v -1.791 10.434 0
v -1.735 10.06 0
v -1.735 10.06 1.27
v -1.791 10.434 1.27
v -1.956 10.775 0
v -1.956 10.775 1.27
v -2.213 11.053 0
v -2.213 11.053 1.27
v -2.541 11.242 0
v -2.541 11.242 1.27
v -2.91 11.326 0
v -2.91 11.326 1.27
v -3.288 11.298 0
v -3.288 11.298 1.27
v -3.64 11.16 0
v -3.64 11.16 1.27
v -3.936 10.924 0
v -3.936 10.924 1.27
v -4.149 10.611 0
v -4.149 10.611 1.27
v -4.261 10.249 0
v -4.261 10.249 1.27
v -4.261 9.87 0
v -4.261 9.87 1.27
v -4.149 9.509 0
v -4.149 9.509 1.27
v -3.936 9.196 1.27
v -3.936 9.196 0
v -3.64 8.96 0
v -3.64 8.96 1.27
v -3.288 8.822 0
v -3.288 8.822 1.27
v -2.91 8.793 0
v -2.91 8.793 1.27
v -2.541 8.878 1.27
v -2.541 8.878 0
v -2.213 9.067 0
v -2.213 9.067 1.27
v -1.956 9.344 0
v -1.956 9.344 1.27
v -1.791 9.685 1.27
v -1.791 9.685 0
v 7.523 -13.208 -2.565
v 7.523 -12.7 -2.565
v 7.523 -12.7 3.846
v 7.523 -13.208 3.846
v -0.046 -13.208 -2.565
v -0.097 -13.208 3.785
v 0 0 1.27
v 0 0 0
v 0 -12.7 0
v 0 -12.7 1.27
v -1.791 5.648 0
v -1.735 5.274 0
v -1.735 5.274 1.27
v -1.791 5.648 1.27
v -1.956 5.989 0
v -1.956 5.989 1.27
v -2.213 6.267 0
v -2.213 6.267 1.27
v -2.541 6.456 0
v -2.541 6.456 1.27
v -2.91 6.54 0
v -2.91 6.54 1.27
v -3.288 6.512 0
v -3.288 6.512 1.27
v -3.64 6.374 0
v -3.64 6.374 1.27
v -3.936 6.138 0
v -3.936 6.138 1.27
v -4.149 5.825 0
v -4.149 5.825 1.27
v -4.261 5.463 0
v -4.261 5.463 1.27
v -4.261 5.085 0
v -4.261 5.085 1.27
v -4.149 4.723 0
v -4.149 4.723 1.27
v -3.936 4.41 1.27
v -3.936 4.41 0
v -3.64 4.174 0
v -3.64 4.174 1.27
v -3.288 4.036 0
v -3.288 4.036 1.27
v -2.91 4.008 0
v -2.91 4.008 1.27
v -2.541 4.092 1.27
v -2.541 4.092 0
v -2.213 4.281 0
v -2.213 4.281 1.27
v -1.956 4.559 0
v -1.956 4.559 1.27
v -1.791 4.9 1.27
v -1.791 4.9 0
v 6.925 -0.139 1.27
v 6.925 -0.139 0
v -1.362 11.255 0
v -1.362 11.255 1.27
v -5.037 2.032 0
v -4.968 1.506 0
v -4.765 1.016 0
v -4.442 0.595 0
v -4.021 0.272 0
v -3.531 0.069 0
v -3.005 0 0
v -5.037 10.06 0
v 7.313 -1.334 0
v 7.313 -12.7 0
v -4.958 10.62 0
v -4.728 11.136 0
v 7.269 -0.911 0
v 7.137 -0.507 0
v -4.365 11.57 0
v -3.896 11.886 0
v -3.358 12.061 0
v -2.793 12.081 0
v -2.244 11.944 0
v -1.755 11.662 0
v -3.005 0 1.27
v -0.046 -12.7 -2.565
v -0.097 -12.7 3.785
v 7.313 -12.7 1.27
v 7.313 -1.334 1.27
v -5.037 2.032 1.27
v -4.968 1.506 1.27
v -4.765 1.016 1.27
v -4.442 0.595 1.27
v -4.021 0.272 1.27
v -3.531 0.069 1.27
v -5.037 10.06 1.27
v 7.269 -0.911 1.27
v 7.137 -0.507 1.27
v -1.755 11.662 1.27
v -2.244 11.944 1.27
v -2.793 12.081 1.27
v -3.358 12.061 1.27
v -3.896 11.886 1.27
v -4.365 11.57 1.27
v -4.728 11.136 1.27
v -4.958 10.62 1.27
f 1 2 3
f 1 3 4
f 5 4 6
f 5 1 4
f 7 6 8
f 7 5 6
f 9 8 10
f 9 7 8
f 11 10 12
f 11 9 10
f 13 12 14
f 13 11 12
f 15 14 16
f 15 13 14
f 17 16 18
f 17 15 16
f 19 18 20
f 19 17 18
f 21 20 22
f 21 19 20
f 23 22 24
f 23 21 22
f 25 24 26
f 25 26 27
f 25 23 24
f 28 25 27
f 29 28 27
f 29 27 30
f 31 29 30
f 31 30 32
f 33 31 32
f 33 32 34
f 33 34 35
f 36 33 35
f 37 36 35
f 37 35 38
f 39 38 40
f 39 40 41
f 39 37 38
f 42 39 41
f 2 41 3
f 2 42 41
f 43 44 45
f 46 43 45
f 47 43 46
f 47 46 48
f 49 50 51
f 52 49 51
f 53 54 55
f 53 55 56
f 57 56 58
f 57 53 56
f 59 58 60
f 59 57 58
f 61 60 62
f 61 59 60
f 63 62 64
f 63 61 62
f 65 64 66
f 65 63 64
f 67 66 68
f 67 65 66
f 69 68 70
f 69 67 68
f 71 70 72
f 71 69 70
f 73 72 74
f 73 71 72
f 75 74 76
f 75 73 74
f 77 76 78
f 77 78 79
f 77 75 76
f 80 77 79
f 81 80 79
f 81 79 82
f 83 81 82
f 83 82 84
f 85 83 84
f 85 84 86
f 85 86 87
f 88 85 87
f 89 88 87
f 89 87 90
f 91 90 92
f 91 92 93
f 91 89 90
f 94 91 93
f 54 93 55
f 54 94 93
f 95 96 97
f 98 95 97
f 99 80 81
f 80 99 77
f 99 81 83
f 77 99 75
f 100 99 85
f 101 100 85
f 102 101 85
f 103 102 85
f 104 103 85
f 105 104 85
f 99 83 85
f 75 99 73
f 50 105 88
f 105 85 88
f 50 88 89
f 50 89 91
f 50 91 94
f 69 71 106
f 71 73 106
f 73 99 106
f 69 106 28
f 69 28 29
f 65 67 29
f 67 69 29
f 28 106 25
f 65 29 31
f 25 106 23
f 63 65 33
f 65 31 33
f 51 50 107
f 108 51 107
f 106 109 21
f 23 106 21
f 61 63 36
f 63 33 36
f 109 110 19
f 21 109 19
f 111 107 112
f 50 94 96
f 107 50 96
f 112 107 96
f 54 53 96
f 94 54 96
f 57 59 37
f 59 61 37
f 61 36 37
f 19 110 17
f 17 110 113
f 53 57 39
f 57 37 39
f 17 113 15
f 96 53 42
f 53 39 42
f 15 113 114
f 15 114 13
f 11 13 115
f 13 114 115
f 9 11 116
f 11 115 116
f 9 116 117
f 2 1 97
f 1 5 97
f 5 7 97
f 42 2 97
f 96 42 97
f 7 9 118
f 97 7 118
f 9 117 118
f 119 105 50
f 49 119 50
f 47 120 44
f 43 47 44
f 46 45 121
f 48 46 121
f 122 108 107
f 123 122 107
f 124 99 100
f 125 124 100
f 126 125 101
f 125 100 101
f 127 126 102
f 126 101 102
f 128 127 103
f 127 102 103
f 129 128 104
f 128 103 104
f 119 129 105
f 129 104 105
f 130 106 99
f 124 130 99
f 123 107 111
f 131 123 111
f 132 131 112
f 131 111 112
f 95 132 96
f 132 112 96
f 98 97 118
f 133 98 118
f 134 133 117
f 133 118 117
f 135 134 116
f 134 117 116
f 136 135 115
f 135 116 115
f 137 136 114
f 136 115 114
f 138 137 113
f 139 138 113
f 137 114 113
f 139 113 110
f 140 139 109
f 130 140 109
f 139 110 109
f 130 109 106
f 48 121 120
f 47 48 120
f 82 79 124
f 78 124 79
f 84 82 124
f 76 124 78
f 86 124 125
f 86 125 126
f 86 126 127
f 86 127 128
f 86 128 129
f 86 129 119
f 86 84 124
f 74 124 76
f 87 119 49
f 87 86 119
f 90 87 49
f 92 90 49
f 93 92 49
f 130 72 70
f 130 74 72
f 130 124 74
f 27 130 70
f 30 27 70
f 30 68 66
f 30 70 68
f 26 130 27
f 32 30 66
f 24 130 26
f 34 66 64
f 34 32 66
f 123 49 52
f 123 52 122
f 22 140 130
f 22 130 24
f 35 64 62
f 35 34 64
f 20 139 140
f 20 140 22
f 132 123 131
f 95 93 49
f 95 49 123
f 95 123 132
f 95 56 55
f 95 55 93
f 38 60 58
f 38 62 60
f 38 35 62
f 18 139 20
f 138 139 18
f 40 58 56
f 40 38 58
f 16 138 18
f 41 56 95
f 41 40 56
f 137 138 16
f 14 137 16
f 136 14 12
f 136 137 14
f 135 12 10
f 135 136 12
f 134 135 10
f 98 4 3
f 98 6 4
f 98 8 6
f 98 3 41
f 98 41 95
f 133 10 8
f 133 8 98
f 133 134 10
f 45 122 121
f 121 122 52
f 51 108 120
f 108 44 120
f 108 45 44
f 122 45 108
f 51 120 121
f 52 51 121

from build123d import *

# Parameters (mm, degrees)
SKETCH1_R           = 1.27
BOSS_EXTRUDE1_DEPTH = 1.27
BOSS_EXTRUDE2_DEPTH = 0.508


with BuildPart() as part:
    # Sketch1 → Boss-Extrude1 (new body)
    with BuildSketch(Plane.XY):
        with BuildLine():
            Line((6.924783114, -0.138801739), (-1.3615811, 11.254923221))
            ThreePointArc((-1.3615811, 11.254923221), (-3.633316734, 11.992153009), (-5.036931534, 10.059756558))
            Line((-5.036931534, 10.059756558), (-5.036931534, 2.032))
            ThreePointArc((-5.036931534, 2.032), (-4.441772513, 0.595159021), (-3.004931534, 0))
            Line((-3.004931534, 0), (0, 0))
            Line((0, 0), (0, -12.7))
            Line((0, -12.7), (7.31343268, -12.7))
            Line((7.31343268, -12.7), (7.31343268, -1.333968401))
            ThreePointArc((7.31343268, -1.333968401), (7.21382913, -0.705583202), (6.924783114, -0.138801739))
        make_face()
        with Locations((-3.004931534, 10.059756558)):
            Circle(SKETCH1_R, mode=Mode.SUBTRACT)
        with Locations((-3.004931534, 5.27395868)):
            Circle(SKETCH1_R, mode=Mode.SUBTRACT)
    extrude(amount=BOSS_EXTRUDE1_DEPTH)

    # Sketch2 → Boss-Extrude2 (add)
    with BuildSketch(Plane(origin=(0, -12.7, 0), x_dir=(-1, 0, 0), z_dir=(0, -1, 0))):
        Polygon((-7.52318228, 2.564928968), (-7.52318228, -3.846337758), (0.09681772, -3.785071032), (0.045762115, 2.564928968), align=None)
    extrude(amount=BOSS_EXTRUDE2_DEPTH)


solid = part.part
